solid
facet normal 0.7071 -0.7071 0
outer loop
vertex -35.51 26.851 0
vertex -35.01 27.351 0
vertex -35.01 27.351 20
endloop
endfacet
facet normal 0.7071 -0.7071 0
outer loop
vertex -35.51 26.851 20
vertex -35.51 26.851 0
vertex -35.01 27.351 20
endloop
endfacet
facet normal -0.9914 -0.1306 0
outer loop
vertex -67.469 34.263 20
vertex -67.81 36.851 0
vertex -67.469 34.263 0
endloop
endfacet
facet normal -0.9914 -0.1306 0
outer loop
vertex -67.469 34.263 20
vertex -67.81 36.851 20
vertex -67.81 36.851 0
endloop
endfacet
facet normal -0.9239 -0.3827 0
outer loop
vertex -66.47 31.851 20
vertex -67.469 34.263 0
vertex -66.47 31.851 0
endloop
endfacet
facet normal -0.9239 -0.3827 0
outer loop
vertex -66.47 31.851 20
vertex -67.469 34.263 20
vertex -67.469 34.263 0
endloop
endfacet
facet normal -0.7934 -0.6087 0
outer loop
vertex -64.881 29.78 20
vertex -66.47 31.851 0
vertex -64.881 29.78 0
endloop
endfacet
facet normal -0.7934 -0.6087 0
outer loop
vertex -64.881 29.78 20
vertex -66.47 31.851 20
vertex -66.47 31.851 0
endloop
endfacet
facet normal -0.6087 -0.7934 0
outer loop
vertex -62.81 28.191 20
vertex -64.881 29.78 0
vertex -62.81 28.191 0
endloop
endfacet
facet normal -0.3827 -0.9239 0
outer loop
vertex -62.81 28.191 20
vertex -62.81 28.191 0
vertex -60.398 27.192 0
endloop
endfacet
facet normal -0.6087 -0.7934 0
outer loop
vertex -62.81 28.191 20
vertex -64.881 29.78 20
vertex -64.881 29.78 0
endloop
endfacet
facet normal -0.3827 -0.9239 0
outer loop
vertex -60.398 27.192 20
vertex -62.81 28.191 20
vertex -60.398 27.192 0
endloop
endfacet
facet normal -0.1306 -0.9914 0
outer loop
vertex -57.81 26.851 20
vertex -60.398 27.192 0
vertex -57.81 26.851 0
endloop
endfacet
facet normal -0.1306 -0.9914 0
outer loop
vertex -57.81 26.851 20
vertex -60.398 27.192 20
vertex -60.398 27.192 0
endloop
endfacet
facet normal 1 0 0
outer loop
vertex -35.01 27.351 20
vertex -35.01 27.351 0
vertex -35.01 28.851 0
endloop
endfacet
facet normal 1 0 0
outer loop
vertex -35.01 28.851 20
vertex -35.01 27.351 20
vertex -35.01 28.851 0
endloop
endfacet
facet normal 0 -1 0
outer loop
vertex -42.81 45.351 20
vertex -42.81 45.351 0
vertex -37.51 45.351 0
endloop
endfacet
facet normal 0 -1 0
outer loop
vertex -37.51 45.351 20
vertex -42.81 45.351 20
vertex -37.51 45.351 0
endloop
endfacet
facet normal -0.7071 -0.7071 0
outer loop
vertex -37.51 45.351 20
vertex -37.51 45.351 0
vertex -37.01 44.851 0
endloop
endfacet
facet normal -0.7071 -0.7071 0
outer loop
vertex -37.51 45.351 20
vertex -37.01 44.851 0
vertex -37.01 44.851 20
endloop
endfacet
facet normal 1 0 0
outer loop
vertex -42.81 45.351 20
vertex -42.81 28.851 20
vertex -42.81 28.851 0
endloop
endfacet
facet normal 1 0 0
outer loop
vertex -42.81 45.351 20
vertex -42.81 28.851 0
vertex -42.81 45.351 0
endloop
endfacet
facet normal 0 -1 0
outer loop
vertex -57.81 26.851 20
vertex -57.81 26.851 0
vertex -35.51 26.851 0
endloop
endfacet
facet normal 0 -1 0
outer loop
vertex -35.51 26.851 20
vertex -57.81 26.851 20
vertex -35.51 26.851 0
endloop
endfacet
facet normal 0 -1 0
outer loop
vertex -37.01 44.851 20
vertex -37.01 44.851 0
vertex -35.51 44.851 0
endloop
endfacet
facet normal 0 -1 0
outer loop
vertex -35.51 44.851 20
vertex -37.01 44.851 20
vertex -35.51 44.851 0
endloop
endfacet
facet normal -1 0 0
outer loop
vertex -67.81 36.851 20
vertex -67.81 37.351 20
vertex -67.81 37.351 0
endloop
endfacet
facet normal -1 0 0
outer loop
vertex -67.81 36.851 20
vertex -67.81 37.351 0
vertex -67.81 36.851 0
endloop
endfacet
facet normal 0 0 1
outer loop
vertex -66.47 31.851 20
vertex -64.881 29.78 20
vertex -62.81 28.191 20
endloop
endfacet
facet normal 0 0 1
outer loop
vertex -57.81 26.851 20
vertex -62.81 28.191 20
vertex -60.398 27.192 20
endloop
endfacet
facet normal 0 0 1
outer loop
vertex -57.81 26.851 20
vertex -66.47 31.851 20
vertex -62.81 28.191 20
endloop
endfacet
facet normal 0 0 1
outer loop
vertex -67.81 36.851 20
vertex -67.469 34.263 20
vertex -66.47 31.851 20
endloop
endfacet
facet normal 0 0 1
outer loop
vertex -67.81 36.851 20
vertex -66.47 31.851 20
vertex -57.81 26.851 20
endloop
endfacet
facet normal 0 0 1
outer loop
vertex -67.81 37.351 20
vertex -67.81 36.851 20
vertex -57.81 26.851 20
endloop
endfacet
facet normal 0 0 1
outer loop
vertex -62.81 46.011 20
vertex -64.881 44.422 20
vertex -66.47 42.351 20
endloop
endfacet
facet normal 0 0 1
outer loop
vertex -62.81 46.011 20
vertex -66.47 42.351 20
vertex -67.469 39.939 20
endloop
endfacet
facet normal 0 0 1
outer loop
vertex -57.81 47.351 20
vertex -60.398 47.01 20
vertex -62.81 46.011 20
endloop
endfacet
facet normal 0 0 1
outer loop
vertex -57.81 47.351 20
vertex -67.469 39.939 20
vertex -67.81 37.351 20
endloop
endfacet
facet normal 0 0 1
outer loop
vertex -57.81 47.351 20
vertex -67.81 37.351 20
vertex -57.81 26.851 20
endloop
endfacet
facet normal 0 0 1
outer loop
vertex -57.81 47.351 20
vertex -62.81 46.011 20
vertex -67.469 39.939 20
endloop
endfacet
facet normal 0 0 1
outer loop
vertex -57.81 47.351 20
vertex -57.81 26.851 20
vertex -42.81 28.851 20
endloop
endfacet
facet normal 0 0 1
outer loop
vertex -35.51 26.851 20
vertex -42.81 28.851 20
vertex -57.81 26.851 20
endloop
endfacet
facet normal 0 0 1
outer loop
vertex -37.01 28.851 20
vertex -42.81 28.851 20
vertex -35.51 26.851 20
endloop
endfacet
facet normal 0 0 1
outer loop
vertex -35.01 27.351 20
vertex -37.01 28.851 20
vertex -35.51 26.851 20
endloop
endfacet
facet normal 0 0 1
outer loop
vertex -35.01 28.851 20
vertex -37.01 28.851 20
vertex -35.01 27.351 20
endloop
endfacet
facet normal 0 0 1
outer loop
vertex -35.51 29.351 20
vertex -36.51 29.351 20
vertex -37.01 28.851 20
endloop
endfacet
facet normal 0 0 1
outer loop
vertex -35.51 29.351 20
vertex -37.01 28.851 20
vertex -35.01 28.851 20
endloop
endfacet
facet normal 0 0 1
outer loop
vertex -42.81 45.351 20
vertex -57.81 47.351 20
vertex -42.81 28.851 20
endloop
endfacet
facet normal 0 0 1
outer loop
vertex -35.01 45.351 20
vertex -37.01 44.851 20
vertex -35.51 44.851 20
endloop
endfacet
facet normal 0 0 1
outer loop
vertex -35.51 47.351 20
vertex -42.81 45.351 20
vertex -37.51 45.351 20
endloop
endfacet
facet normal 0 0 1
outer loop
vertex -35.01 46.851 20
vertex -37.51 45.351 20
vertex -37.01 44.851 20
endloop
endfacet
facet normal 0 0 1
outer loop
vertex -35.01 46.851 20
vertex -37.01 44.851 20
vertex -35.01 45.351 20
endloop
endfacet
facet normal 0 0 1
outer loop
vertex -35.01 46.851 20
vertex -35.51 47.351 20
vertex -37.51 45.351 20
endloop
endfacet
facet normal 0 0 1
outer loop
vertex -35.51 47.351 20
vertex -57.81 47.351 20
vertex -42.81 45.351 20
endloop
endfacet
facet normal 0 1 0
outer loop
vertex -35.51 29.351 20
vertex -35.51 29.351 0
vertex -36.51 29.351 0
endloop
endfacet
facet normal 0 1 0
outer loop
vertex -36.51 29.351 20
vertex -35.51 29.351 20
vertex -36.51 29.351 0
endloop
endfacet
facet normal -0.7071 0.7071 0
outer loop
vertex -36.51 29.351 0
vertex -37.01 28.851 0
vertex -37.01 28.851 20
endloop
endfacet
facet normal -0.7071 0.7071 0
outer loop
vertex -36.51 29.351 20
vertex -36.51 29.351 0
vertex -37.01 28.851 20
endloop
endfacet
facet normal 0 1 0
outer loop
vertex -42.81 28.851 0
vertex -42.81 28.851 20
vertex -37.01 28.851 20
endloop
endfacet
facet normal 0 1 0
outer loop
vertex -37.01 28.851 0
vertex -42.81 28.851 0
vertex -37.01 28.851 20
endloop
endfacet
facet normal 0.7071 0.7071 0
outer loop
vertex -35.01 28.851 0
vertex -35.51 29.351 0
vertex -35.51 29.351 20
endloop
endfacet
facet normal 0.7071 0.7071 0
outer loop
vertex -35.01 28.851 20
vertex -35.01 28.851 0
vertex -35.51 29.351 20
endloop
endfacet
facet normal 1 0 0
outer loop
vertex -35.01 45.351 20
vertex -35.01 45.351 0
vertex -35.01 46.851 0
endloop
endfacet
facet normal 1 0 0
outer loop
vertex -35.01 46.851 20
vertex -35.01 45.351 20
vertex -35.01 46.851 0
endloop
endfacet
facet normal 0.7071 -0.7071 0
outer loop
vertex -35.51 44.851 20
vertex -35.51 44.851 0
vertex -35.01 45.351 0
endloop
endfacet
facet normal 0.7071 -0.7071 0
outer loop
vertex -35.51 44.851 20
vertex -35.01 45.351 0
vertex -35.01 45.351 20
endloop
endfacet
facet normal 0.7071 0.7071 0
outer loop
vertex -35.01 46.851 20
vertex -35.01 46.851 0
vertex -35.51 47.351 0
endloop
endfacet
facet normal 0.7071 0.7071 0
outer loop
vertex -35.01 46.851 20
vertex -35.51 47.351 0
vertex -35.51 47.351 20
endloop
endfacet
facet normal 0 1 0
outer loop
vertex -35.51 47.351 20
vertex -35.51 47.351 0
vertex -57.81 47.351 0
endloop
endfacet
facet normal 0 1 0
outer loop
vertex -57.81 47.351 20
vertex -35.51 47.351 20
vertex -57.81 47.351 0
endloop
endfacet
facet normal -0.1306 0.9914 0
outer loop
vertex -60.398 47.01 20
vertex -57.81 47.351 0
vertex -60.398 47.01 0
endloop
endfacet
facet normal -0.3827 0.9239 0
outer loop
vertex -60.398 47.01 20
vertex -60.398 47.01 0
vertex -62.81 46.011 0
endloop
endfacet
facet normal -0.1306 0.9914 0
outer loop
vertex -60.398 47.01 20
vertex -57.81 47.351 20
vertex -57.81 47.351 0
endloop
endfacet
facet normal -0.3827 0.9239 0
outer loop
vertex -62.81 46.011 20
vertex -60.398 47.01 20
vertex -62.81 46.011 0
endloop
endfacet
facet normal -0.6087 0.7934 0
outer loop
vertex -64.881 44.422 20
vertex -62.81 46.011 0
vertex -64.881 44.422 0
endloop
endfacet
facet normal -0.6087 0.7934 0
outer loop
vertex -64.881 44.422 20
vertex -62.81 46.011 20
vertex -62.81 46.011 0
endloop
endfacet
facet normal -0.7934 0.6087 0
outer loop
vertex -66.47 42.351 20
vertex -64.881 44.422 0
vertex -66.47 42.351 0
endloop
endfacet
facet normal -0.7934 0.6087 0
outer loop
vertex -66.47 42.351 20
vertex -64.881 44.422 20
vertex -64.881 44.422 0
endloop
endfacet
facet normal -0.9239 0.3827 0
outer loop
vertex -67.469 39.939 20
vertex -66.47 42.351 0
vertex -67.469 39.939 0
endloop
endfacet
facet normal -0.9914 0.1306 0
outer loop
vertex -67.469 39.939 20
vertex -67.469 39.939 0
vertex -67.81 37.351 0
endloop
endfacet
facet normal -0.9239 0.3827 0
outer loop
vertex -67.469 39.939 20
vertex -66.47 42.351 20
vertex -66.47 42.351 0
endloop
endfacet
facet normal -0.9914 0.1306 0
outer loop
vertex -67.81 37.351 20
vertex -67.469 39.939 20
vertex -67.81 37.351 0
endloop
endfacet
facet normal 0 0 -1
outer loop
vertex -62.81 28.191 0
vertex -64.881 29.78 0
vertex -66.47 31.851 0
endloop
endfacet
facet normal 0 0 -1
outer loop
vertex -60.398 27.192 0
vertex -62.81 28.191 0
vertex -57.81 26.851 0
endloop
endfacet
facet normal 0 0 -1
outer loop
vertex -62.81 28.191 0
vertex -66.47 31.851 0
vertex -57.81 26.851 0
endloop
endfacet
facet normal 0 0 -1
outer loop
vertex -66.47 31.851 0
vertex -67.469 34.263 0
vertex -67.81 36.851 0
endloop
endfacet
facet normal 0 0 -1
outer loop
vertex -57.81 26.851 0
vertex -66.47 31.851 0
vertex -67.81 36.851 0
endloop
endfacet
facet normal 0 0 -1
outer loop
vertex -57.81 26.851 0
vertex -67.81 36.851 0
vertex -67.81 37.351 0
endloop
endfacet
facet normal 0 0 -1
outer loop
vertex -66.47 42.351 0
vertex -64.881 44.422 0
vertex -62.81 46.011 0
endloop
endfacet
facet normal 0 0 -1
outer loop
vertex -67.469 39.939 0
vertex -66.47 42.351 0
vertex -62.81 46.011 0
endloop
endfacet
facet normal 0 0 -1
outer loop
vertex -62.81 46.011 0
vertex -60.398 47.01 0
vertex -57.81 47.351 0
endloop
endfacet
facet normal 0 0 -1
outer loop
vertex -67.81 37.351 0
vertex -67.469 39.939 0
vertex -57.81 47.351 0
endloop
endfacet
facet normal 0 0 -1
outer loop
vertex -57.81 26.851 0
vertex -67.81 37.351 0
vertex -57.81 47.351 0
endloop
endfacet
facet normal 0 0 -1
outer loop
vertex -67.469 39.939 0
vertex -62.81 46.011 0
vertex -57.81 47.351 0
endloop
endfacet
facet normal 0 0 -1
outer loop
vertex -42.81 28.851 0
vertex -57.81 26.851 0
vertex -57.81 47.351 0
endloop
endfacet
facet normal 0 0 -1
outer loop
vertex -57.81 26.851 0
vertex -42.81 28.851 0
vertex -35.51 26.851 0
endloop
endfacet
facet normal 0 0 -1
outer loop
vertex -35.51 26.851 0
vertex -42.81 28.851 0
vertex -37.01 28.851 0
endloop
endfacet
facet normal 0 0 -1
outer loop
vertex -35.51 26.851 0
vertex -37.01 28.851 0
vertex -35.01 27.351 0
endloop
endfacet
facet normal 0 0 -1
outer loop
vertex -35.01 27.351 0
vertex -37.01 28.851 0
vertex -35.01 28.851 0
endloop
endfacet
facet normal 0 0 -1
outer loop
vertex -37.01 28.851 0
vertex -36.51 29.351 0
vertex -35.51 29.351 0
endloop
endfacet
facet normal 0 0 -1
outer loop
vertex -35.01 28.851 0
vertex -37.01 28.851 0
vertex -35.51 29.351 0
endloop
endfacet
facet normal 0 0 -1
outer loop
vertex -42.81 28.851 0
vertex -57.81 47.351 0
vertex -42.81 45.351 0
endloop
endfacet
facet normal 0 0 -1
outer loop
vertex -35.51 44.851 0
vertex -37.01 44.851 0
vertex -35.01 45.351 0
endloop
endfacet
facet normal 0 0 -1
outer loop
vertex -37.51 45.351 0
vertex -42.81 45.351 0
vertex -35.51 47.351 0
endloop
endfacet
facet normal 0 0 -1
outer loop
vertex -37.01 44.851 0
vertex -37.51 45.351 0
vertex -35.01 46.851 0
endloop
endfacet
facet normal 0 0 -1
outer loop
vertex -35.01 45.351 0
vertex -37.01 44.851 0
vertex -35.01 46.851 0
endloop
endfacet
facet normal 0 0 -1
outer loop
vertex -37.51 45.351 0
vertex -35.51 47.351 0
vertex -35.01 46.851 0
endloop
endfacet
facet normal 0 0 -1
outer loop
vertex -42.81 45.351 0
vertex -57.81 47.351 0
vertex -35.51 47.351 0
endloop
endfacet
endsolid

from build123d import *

# Parameters (mm, degrees)
F0_W     = 5.8
F0_H     = 2
F1_DEPTH = 20
F2_R     = 10
F3_SIZE  = 0.49999


# Not quite as in the source:
# - a fillet or chamfer is up to 0.001 mm smaller than in the source, because OpenCascade refuses the exact size


with BuildPart() as f1:
    # F0 (on Top) → F1 (new body)
    with BuildSketch(Plane.XY):
        with Locations((-39.9097009659, 46.350823313)):
            Rectangle(F0_W, F0_H)
        Polygon((-42.8097009659, 45.350823313), (-42.8097009659, 47.350823313), (-67.8097009659, 47.350823313), (-67.8097009659, 26.850823313), (-42.8097009659, 26.850823313), (-42.8097009659, 28.850823313), align=None)
        Polygon((-35.0097009659, 47.350823313), (-37.0097009659, 47.350823313), (-37.0097009659, 45.350823313), (-37.0097009659, 44.850823313), (-35.0097009659, 44.850823313), align=None)
        with Locations((-39.9097009659, 27.850823313)):
            Rectangle(F0_W, F0_H)
        Polygon((-37.0097009659, 29.350823313), (-37.0097009659, 28.850823313), (-37.0097009659, 26.850823313), (-35.0097009659, 26.850823313), (-35.0097009659, 29.350823313), align=None)
    extrude(amount=F1_DEPTH)

    # F2
    f2_edges = [f1.edges().sort_by_distance(p)[0] for p in [
        (-67.809701, 47.350823, 10),
        (-67.809701, 26.850823, 10),
    ]]
    fillet(f2_edges, radius=F2_R)

    # F3 (size 0.5 in the source; OpenCascade refuses exactly that, so slightly less here)
    f3_edges = [f1.edges().sort_by_distance(p)[0] for p in [
        (-35.009701, 47.350823, 10),
        (-35.009701, 44.850823, 10),
        (-35.009701, 29.350823, 10),
        (-35.009701, 26.850823, 10),
        (-37.009701, 29.350823, 10),
        (-37.009701, 45.350823, 10),
    ]]
    chamfer(f3_edges, length=F3_SIZE)


solid = f1.part
